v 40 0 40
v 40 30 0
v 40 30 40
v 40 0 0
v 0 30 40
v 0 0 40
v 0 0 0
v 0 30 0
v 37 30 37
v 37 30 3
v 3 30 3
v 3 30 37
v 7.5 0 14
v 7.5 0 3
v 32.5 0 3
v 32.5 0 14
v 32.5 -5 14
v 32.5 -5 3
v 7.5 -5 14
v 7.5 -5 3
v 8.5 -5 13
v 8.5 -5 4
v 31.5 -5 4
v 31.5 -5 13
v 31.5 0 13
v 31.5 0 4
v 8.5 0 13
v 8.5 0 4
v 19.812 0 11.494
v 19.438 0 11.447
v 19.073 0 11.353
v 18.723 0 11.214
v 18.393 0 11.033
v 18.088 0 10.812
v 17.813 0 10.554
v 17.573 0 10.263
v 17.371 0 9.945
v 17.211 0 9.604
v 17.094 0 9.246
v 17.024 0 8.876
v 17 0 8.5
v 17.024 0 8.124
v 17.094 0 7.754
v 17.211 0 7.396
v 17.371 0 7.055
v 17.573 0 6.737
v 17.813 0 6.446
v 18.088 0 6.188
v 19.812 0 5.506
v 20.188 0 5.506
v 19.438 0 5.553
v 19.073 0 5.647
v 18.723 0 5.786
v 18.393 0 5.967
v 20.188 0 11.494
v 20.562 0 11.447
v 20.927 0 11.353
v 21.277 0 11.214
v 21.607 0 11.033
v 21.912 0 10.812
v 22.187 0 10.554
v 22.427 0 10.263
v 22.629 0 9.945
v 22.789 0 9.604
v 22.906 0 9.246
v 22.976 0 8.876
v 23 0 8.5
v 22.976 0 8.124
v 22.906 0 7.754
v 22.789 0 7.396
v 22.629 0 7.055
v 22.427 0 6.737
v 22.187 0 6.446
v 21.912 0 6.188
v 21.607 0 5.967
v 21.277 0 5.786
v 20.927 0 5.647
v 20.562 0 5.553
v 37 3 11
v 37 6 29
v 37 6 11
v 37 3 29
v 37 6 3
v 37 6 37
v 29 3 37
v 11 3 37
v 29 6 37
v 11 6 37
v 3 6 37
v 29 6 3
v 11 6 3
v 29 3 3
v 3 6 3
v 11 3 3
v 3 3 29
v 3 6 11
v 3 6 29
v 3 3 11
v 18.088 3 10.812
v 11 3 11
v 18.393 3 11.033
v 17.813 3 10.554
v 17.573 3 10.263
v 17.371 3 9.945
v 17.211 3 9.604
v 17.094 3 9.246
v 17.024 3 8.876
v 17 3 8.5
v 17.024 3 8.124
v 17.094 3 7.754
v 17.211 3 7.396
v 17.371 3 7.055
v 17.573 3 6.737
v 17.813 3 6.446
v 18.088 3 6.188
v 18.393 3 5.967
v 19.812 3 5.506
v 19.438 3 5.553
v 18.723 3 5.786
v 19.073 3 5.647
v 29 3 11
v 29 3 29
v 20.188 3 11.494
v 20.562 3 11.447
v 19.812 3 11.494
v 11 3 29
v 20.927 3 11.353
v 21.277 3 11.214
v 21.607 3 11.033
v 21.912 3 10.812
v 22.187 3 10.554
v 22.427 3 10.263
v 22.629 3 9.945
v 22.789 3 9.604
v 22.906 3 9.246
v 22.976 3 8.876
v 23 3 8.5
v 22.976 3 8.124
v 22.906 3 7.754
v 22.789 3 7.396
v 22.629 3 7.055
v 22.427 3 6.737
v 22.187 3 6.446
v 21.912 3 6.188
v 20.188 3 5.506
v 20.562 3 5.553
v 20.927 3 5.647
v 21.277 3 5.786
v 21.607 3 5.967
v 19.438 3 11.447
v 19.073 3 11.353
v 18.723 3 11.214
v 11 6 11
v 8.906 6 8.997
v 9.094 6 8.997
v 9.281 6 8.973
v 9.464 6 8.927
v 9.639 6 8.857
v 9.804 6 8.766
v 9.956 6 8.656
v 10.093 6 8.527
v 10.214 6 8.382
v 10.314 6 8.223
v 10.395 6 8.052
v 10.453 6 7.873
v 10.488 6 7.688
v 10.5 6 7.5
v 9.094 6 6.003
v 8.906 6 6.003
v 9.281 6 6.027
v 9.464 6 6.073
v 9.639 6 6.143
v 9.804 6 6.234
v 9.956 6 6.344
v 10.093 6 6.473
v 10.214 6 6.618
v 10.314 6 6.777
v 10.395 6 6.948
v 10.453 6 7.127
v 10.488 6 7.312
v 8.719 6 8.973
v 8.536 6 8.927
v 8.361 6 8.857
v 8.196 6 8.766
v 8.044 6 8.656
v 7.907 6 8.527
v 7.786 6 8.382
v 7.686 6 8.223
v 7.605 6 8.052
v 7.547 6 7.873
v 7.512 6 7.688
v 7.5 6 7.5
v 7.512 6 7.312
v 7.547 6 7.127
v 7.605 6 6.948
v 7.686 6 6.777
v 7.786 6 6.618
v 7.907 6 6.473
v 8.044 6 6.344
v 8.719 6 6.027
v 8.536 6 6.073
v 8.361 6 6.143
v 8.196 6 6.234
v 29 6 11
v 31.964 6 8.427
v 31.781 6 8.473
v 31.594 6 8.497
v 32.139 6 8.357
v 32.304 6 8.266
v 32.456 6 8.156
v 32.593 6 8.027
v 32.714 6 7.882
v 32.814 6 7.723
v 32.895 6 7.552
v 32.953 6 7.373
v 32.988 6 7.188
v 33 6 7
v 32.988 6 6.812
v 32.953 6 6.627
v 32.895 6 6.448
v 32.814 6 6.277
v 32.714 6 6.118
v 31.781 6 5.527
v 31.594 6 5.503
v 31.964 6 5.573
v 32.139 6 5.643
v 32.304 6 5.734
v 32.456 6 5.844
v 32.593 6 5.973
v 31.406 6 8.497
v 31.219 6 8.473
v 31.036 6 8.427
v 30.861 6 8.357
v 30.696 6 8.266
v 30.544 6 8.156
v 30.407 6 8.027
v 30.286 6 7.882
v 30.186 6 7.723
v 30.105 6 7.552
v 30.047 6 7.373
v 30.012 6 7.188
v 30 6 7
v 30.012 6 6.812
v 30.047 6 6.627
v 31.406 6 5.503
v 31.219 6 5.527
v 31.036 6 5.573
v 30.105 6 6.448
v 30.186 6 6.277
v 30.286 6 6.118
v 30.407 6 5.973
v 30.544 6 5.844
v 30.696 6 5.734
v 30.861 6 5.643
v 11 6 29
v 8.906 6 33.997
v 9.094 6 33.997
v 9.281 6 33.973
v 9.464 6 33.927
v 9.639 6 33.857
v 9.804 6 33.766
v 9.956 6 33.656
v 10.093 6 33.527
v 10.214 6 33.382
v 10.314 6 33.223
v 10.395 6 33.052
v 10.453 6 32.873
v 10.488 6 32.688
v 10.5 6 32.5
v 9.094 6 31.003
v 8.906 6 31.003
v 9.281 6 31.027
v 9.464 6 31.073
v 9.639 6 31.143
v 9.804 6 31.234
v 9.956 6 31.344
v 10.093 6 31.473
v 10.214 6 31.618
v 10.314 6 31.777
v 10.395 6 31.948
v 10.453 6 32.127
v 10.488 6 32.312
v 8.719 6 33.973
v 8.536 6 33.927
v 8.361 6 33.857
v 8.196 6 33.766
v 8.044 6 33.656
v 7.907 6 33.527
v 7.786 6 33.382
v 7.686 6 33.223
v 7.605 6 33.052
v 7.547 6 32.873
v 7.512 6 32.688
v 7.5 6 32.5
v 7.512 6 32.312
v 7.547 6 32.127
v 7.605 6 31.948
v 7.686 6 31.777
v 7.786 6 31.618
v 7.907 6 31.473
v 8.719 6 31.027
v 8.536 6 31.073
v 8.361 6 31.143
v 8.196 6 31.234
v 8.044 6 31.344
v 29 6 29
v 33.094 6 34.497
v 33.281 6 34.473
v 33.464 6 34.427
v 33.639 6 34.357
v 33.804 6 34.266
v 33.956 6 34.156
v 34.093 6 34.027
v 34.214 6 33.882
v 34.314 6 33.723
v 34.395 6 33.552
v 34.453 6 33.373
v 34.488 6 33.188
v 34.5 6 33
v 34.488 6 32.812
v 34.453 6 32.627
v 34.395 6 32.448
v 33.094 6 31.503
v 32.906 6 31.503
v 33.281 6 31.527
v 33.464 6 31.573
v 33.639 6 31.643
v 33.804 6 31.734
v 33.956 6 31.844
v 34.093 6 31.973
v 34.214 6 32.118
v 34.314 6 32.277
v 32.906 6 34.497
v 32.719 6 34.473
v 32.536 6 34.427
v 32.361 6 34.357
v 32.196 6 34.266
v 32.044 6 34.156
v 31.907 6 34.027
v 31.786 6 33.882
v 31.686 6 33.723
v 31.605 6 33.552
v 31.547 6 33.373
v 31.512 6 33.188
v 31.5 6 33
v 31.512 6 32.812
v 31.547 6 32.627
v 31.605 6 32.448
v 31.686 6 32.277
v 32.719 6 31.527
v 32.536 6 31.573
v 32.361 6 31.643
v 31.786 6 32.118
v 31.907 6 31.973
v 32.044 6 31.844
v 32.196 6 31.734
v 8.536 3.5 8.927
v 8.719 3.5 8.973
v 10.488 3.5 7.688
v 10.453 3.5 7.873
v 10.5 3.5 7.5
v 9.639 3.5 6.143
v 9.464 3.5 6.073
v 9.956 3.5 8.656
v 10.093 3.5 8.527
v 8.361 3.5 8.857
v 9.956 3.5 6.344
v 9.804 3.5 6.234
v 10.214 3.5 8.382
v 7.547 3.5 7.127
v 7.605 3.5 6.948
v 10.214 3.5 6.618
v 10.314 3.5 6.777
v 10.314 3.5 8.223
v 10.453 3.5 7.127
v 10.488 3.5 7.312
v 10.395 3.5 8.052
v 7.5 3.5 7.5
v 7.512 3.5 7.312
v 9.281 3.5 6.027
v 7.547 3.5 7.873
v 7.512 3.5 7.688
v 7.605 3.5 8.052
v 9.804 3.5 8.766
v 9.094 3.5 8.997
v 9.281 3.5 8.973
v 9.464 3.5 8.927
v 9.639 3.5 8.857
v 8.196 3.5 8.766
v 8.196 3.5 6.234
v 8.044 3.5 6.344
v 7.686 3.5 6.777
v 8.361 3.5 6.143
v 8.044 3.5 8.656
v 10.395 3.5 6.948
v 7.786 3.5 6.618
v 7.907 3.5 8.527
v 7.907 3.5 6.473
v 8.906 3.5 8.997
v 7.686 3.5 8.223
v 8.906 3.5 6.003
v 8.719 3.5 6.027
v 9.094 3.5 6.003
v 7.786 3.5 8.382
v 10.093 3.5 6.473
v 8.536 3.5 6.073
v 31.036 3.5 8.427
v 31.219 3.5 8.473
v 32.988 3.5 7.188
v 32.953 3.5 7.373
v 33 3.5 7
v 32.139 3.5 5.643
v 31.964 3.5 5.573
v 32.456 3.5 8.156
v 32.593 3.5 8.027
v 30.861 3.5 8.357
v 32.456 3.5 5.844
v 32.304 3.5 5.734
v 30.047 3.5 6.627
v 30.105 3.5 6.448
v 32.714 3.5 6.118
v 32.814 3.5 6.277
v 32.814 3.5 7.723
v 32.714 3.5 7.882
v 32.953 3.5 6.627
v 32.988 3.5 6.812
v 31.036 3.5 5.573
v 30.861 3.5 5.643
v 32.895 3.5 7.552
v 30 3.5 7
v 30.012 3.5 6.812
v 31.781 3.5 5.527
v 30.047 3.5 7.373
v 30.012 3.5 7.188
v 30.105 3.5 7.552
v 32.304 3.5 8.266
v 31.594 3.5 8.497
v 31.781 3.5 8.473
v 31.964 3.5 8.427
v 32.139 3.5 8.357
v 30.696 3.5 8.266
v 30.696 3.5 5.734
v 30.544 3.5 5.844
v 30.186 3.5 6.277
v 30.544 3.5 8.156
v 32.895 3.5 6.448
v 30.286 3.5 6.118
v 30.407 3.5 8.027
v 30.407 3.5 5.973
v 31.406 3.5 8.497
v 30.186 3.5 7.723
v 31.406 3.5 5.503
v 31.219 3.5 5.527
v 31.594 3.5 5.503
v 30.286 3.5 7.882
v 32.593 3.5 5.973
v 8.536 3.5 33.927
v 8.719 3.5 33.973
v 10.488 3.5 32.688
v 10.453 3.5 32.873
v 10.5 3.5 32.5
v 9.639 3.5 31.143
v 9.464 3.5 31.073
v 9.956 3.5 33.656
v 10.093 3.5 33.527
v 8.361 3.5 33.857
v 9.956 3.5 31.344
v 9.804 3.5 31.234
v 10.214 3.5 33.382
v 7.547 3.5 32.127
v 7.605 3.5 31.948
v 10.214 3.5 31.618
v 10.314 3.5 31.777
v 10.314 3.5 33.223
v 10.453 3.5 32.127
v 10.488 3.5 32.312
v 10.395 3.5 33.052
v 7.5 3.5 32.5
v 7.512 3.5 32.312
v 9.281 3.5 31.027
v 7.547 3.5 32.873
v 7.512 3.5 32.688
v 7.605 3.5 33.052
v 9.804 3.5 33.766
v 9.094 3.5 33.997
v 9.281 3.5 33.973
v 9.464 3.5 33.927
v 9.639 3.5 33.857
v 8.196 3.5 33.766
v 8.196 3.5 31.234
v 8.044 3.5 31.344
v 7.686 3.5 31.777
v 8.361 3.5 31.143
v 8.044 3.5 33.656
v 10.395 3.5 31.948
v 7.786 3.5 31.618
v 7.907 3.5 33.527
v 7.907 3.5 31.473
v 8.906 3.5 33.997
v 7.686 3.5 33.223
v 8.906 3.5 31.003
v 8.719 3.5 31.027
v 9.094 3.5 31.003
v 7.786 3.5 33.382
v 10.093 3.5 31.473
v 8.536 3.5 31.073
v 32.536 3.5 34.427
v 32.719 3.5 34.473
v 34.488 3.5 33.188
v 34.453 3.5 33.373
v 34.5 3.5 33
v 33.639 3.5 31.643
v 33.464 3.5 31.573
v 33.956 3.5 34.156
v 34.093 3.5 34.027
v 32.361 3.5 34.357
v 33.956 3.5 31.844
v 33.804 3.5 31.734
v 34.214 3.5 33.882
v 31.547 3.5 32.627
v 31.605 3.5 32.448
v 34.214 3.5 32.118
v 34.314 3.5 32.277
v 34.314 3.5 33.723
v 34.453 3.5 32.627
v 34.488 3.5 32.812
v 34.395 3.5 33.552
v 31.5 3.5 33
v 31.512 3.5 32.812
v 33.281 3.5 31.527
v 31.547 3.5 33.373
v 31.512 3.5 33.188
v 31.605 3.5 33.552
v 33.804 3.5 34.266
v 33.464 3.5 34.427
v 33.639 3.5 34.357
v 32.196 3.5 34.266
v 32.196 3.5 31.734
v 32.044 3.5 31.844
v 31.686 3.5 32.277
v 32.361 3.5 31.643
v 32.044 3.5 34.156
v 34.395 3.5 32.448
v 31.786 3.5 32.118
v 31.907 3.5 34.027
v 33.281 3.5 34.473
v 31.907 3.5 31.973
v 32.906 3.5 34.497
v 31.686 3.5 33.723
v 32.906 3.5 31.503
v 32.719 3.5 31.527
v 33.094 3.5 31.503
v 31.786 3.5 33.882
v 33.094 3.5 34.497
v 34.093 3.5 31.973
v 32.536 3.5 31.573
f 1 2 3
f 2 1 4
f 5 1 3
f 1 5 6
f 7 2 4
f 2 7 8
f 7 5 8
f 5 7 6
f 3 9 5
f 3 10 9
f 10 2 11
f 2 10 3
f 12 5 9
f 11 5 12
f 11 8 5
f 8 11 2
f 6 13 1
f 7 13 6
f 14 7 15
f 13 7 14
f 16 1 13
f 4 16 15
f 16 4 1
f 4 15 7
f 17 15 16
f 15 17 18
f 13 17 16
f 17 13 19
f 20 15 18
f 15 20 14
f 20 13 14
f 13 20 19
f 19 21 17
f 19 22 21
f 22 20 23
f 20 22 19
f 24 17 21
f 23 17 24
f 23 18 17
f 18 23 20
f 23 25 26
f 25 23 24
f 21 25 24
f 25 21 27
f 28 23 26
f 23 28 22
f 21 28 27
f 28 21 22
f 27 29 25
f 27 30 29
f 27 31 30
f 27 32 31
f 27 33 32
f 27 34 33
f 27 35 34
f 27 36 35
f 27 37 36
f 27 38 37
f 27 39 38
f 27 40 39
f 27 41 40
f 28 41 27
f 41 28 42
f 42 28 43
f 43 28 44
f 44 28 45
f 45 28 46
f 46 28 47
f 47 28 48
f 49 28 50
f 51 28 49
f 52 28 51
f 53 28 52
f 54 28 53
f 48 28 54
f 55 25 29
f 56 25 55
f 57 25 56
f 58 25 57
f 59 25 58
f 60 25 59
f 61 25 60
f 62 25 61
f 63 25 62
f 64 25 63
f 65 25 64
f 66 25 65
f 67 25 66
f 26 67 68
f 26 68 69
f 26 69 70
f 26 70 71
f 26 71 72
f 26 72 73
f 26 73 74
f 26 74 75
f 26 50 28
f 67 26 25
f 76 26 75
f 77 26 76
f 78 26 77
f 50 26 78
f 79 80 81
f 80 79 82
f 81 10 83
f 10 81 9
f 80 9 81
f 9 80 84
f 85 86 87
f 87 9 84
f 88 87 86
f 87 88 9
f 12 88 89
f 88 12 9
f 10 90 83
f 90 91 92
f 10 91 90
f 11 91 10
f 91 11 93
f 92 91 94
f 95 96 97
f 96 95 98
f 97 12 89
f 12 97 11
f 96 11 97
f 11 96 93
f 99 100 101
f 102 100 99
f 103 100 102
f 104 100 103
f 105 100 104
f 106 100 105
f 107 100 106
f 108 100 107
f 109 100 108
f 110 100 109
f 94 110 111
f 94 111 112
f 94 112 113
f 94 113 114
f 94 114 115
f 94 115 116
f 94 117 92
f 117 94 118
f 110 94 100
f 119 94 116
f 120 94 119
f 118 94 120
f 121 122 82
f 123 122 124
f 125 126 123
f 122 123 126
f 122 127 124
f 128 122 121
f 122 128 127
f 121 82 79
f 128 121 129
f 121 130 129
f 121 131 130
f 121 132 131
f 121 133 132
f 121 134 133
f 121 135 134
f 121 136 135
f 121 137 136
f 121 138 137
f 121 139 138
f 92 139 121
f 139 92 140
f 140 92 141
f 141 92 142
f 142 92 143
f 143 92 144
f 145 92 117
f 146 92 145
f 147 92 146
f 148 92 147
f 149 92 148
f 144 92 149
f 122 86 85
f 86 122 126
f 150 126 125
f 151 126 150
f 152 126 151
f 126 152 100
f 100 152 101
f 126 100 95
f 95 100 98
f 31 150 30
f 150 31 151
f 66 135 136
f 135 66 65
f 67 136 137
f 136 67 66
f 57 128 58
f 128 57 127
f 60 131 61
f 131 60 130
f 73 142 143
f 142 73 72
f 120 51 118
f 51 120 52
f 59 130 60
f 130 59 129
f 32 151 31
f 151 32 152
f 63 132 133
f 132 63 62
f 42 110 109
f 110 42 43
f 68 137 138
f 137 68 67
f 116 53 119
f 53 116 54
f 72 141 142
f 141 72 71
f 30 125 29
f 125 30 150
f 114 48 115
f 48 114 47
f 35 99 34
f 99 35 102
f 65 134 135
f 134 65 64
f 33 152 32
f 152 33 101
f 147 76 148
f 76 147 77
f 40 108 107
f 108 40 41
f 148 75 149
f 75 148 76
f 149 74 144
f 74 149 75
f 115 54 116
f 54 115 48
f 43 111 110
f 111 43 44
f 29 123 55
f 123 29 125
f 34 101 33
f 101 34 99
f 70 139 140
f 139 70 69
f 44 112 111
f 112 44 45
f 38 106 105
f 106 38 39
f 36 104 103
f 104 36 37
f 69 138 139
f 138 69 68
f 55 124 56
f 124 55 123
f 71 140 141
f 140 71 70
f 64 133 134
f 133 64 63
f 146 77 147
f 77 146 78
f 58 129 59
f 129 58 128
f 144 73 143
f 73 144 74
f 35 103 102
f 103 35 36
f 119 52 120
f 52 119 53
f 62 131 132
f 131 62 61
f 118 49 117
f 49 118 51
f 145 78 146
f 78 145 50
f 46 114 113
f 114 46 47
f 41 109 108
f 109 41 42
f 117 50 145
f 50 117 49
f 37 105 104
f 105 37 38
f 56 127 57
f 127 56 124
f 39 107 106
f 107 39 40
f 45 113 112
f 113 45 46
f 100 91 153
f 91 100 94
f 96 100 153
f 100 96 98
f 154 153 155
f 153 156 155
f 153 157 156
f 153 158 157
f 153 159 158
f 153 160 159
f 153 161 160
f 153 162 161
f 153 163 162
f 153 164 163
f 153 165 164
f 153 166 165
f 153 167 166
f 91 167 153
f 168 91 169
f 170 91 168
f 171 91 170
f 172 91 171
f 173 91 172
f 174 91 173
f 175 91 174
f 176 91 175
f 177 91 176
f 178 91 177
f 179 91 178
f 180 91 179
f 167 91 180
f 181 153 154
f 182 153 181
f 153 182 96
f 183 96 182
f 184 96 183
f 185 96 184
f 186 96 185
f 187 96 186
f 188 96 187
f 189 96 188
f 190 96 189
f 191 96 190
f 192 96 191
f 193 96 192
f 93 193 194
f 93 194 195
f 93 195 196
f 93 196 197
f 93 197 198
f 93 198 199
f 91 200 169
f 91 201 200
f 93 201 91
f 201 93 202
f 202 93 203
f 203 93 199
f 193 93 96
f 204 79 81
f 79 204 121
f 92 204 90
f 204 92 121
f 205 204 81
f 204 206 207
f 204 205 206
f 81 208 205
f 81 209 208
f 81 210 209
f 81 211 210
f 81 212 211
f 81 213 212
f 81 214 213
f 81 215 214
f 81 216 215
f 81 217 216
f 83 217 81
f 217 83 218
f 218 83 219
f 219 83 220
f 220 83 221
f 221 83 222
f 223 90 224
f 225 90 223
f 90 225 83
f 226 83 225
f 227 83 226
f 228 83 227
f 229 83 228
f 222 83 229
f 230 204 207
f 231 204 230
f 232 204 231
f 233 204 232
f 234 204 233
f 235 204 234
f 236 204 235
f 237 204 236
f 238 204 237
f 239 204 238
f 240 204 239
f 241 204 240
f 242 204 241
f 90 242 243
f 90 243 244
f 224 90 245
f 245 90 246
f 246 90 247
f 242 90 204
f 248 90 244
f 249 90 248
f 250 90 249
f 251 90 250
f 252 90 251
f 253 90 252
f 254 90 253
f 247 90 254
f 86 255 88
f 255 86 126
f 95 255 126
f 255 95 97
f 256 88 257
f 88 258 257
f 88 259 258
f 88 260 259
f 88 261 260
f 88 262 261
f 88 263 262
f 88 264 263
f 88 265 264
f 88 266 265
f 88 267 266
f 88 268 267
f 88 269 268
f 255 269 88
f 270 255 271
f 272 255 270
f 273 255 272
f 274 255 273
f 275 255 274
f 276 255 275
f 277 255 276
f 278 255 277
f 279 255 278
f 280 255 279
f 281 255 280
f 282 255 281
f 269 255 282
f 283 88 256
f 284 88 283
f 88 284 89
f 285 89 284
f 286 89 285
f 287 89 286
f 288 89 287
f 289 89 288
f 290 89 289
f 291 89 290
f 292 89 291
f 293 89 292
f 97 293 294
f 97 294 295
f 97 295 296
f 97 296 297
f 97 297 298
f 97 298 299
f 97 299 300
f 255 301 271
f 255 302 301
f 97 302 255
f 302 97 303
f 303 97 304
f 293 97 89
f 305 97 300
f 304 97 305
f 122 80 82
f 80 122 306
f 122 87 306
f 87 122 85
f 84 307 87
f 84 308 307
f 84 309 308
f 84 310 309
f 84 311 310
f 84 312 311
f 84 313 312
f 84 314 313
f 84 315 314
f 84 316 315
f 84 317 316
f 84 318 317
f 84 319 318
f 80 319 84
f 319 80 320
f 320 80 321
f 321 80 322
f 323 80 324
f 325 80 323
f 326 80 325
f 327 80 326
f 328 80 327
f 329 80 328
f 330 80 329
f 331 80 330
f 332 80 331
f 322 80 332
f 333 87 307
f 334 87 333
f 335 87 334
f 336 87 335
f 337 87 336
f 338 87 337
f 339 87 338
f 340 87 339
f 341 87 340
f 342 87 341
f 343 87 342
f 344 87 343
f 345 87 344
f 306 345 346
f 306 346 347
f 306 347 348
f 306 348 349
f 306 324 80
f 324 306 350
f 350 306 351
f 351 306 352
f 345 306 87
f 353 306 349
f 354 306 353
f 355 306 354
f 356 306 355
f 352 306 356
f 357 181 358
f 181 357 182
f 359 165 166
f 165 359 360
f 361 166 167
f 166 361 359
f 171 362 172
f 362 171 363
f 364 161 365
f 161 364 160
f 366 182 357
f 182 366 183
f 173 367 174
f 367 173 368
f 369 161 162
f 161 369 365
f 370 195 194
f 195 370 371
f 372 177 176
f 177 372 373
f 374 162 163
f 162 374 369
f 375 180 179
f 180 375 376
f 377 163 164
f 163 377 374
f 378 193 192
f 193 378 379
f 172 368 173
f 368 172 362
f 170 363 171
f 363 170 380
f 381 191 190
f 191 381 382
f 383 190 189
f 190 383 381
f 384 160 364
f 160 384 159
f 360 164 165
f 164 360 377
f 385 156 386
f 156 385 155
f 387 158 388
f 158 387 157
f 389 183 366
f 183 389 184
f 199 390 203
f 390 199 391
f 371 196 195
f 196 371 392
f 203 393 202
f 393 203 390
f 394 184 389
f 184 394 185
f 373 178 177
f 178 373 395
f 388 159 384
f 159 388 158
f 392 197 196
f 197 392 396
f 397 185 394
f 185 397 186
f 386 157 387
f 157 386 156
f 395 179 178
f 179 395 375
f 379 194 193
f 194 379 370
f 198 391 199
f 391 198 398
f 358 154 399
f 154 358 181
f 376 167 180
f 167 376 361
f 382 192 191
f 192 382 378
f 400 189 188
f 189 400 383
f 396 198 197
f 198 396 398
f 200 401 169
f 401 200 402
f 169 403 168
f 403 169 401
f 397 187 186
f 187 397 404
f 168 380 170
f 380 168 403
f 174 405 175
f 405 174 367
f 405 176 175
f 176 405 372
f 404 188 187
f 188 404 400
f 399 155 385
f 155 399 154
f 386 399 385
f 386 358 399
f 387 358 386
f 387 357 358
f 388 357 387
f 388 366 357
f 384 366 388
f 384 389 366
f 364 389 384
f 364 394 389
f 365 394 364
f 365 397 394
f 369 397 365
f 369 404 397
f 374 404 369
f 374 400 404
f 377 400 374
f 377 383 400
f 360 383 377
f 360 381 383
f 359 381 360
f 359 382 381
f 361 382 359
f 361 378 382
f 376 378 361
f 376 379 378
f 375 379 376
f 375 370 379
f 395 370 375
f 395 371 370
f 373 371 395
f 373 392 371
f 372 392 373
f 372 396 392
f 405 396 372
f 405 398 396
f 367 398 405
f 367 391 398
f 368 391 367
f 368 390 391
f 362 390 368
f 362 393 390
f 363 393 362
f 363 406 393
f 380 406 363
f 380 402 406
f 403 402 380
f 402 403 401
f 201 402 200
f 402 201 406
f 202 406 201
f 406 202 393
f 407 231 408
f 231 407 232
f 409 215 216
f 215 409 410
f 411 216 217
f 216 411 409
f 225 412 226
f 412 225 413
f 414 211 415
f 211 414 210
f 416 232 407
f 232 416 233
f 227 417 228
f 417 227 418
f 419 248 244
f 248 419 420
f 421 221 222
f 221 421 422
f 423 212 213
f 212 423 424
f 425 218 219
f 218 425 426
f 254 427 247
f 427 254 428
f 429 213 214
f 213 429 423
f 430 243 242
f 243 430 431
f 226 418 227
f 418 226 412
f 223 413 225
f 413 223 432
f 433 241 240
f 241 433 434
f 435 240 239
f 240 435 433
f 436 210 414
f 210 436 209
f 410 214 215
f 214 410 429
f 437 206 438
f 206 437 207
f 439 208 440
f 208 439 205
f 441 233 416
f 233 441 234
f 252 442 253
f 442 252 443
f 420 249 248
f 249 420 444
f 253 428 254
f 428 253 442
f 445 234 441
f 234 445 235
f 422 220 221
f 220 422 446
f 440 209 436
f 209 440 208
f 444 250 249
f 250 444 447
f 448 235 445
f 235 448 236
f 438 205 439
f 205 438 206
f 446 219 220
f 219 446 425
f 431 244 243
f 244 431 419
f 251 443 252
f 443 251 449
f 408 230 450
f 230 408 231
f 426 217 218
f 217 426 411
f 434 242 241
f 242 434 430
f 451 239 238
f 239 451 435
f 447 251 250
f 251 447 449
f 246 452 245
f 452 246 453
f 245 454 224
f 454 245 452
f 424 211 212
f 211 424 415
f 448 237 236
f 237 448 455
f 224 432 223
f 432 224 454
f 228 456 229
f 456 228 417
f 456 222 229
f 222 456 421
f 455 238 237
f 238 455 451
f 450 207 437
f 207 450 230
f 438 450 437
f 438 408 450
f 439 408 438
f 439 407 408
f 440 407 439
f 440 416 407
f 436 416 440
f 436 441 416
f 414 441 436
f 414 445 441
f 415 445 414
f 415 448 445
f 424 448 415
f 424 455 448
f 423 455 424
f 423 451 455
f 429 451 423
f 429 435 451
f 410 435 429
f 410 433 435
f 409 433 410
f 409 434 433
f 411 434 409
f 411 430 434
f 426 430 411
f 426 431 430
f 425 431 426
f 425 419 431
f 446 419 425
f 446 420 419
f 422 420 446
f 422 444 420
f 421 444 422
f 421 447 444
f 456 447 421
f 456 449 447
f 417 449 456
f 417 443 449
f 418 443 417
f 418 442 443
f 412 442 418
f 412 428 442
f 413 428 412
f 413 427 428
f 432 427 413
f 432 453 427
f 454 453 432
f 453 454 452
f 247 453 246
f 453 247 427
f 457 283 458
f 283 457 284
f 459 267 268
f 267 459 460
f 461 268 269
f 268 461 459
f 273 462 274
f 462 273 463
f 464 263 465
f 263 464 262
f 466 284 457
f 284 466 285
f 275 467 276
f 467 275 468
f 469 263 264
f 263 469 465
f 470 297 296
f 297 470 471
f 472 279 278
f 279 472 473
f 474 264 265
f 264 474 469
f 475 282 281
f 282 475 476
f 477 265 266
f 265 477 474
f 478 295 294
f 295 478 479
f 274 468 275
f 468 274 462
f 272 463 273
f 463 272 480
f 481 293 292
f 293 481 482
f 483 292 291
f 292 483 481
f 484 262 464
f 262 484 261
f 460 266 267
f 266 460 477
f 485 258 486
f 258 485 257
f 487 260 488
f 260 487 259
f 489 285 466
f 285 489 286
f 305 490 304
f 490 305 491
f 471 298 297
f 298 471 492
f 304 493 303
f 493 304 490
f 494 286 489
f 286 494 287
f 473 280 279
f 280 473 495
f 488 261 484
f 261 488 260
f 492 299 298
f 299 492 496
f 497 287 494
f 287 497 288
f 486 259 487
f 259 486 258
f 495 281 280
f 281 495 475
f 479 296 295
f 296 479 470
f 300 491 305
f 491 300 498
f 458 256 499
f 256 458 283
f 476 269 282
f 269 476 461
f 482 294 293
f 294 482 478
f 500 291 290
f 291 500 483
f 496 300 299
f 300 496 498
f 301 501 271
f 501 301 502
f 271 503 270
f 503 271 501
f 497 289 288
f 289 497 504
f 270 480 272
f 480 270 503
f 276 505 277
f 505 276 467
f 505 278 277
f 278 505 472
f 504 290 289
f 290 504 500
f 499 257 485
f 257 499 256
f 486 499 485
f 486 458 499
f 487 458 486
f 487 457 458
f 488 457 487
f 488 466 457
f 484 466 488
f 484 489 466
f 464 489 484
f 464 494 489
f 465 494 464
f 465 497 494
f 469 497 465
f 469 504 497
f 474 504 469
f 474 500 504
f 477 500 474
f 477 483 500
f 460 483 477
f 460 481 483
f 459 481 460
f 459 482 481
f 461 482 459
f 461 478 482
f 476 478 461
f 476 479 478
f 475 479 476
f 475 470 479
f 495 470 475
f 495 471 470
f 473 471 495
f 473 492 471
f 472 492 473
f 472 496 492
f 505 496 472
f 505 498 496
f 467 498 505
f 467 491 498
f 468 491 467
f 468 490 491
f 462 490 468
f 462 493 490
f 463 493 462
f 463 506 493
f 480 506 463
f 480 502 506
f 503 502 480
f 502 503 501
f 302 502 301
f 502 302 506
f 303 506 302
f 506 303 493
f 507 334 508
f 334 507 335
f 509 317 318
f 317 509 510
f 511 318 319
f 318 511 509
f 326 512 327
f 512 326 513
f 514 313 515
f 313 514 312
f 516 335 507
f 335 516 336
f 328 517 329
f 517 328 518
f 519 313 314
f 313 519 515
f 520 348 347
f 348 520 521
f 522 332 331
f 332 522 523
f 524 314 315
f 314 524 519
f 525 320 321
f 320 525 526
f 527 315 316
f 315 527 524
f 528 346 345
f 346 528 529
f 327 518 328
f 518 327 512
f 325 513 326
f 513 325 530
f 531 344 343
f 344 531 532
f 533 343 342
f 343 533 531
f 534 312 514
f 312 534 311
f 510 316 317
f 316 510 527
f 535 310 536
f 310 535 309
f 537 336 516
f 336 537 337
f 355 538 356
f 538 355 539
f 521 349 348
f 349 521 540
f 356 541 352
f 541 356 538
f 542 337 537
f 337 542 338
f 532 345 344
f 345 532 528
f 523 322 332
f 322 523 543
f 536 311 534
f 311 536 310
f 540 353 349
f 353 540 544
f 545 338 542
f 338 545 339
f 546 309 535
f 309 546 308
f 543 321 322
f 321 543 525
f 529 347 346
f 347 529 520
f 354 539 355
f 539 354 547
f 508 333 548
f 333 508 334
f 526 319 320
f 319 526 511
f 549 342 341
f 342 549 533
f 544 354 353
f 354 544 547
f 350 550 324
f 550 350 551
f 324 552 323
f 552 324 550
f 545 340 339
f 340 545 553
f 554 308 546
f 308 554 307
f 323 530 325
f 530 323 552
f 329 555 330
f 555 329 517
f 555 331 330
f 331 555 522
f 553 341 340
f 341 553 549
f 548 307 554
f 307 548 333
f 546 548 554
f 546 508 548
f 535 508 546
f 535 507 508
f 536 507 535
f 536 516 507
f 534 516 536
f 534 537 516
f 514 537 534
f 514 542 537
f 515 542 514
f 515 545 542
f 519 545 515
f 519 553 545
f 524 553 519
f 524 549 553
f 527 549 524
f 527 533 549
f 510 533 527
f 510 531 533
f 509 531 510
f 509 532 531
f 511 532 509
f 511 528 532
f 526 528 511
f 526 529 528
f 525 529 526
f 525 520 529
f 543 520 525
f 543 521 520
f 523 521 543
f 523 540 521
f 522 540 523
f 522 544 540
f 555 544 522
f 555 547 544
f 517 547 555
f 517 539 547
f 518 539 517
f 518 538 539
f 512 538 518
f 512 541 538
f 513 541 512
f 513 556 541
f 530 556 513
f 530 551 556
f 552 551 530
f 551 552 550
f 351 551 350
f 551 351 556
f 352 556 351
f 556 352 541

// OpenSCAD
// file: configuration.scad
/*********************************************************************/
/* 	Modified: 14:25 18/07/2014													*/ 
/* 	configuration.scad 															*/ 
/* 																						*/
/* 	This files contains all the variables that are needed to create	*/
/* the fluoroscence module.														*/
/* Set the desired values here and they will then be used in all the	*/
/* other files to make the module to the correct dimensions.			*/
/* 																						*/
/*********************************************************************/


$fn = 50;


/*
 * Filter dimension variables
 * ====================================================================
 */

filterWidth = 16;
filterLength = 25;
filterThickness = 1;
filterMT = 2; // Thickness of filter support


/*
 * Main box variables
 * ====================================================================
 */

MT = 3; // Material thickness
Screw = 3; // Diameter of screw being used
ExtraM = 2; //Extra material around screw
ScrewM = Screw + ExtraM; // Thickness of screw support 


/*
 * Microscope optics dimensions
 * ====================================================================
 */

CylinderH = 20; // Height of cylinder
CylinderD = 29; // Diameter of optical section
CylinderT = 10; // Thickness of cylinder
// main file
/*********************************************************************/
/* 	Modified: 14:25 22/07/2014													*/
/* 	lightingUnit.scad		 														*/
/* 																						*/
/* 	This files contains two modules that create components relating	*/
/* to the filter. They are:														*/
/* 			1. singleLED - housing for LED connected to power supply		*/
/* 			2. ConstCurrent - housing for LED connected to constant 		*/
/* 								   current supply									*/
/* 			3.	cover - cover for housing - pass "CC" for cover for 		*/
/* 						  ConstCurrent housing. Leave blank otherwise		*/
/* 																						*/
/*********************************************************************/


/*
 * Files needed
 * ====================================================================
 */

include <configuration.scad>;


module singleLED()
{
	difference()
	{
		union()
		{
			cube([40,12,19]);
			translate([7.5,-5,4]) cube([25,5,11]);
		}

		union()
		{
			translate([8.5,-5,5]) cube([23,5,9]);
			translate([2.5,3,3]) cube([34,12,13]);
			translate([20,5,9.5]) rotate([90,0,0]) cylinder(r=3,h=10);
		}
	}
}
ConstCurrent();
module ConstCurrent()
{
	difference()
	{
		union()
		{
			cube([40,30,40]);
			translate([7.5,-5,3]) cube([25,5,11]);
		}

		union()
		{
			translate([8.5,-5,4]) cube([23,5,9]);
			translate([3,3,3]) cube([34,30,34]);
			translate([20,5,8.5]) rotate([90,0,0]) cylinder(r=3,h=10);
		}
	}
	
	difference()
	{
		union()
		{
			translate([3,3,3]) cube([8,3,8]);
			translate([29,3,3]) cube([8,3,8]);
			translate([3,3,29]) cube([8,3,8]);
			translate([29,3,29]) cube([8,3,8]);
		}
		union()
		{
			translate([9,8.5,7.5]) rotate([90,0,0]) cylinder(r=1.5, h=5);
			translate([31.5,8.5,7]) rotate([90,0,0]) cylinder(r=1.5, h=5);
			translate([9,8.5,32.5]) rotate([90,0,0]) cylinder(r=1.5, h=5);
			translate([33,8.5,33]) rotate([90,0,0]) cylinder(r=1.5, h=5);
		}
	}
}


// If cover is required for ConstCurrent housing, pass the string "CC" to cover module.
// If cover is required for singleLED housing, do not pass anything to cover module.
module cover(whichOne)
{
	if (whichOne == "CC")
	{
		//extra = 21;
	}
	else
	{
		//extra = 0;
	}

	difference()
	{
		union()
		{
			cube([40,2,19 + extra]); 
			translate([2.75,-5,3.25]) cube([34,5,12.5 + extra]); 
		}

		union()
		{
			translate([3.75,-5,4.25]) cube([31.5,6,10.5 + extra]); 
			translate([35,3.5,9.5]) rotate([90,0,0]) cylinder(r=1.5, h=9);
			translate([35,-6,8]) cube([7,10,3]);
		}
	}
}
